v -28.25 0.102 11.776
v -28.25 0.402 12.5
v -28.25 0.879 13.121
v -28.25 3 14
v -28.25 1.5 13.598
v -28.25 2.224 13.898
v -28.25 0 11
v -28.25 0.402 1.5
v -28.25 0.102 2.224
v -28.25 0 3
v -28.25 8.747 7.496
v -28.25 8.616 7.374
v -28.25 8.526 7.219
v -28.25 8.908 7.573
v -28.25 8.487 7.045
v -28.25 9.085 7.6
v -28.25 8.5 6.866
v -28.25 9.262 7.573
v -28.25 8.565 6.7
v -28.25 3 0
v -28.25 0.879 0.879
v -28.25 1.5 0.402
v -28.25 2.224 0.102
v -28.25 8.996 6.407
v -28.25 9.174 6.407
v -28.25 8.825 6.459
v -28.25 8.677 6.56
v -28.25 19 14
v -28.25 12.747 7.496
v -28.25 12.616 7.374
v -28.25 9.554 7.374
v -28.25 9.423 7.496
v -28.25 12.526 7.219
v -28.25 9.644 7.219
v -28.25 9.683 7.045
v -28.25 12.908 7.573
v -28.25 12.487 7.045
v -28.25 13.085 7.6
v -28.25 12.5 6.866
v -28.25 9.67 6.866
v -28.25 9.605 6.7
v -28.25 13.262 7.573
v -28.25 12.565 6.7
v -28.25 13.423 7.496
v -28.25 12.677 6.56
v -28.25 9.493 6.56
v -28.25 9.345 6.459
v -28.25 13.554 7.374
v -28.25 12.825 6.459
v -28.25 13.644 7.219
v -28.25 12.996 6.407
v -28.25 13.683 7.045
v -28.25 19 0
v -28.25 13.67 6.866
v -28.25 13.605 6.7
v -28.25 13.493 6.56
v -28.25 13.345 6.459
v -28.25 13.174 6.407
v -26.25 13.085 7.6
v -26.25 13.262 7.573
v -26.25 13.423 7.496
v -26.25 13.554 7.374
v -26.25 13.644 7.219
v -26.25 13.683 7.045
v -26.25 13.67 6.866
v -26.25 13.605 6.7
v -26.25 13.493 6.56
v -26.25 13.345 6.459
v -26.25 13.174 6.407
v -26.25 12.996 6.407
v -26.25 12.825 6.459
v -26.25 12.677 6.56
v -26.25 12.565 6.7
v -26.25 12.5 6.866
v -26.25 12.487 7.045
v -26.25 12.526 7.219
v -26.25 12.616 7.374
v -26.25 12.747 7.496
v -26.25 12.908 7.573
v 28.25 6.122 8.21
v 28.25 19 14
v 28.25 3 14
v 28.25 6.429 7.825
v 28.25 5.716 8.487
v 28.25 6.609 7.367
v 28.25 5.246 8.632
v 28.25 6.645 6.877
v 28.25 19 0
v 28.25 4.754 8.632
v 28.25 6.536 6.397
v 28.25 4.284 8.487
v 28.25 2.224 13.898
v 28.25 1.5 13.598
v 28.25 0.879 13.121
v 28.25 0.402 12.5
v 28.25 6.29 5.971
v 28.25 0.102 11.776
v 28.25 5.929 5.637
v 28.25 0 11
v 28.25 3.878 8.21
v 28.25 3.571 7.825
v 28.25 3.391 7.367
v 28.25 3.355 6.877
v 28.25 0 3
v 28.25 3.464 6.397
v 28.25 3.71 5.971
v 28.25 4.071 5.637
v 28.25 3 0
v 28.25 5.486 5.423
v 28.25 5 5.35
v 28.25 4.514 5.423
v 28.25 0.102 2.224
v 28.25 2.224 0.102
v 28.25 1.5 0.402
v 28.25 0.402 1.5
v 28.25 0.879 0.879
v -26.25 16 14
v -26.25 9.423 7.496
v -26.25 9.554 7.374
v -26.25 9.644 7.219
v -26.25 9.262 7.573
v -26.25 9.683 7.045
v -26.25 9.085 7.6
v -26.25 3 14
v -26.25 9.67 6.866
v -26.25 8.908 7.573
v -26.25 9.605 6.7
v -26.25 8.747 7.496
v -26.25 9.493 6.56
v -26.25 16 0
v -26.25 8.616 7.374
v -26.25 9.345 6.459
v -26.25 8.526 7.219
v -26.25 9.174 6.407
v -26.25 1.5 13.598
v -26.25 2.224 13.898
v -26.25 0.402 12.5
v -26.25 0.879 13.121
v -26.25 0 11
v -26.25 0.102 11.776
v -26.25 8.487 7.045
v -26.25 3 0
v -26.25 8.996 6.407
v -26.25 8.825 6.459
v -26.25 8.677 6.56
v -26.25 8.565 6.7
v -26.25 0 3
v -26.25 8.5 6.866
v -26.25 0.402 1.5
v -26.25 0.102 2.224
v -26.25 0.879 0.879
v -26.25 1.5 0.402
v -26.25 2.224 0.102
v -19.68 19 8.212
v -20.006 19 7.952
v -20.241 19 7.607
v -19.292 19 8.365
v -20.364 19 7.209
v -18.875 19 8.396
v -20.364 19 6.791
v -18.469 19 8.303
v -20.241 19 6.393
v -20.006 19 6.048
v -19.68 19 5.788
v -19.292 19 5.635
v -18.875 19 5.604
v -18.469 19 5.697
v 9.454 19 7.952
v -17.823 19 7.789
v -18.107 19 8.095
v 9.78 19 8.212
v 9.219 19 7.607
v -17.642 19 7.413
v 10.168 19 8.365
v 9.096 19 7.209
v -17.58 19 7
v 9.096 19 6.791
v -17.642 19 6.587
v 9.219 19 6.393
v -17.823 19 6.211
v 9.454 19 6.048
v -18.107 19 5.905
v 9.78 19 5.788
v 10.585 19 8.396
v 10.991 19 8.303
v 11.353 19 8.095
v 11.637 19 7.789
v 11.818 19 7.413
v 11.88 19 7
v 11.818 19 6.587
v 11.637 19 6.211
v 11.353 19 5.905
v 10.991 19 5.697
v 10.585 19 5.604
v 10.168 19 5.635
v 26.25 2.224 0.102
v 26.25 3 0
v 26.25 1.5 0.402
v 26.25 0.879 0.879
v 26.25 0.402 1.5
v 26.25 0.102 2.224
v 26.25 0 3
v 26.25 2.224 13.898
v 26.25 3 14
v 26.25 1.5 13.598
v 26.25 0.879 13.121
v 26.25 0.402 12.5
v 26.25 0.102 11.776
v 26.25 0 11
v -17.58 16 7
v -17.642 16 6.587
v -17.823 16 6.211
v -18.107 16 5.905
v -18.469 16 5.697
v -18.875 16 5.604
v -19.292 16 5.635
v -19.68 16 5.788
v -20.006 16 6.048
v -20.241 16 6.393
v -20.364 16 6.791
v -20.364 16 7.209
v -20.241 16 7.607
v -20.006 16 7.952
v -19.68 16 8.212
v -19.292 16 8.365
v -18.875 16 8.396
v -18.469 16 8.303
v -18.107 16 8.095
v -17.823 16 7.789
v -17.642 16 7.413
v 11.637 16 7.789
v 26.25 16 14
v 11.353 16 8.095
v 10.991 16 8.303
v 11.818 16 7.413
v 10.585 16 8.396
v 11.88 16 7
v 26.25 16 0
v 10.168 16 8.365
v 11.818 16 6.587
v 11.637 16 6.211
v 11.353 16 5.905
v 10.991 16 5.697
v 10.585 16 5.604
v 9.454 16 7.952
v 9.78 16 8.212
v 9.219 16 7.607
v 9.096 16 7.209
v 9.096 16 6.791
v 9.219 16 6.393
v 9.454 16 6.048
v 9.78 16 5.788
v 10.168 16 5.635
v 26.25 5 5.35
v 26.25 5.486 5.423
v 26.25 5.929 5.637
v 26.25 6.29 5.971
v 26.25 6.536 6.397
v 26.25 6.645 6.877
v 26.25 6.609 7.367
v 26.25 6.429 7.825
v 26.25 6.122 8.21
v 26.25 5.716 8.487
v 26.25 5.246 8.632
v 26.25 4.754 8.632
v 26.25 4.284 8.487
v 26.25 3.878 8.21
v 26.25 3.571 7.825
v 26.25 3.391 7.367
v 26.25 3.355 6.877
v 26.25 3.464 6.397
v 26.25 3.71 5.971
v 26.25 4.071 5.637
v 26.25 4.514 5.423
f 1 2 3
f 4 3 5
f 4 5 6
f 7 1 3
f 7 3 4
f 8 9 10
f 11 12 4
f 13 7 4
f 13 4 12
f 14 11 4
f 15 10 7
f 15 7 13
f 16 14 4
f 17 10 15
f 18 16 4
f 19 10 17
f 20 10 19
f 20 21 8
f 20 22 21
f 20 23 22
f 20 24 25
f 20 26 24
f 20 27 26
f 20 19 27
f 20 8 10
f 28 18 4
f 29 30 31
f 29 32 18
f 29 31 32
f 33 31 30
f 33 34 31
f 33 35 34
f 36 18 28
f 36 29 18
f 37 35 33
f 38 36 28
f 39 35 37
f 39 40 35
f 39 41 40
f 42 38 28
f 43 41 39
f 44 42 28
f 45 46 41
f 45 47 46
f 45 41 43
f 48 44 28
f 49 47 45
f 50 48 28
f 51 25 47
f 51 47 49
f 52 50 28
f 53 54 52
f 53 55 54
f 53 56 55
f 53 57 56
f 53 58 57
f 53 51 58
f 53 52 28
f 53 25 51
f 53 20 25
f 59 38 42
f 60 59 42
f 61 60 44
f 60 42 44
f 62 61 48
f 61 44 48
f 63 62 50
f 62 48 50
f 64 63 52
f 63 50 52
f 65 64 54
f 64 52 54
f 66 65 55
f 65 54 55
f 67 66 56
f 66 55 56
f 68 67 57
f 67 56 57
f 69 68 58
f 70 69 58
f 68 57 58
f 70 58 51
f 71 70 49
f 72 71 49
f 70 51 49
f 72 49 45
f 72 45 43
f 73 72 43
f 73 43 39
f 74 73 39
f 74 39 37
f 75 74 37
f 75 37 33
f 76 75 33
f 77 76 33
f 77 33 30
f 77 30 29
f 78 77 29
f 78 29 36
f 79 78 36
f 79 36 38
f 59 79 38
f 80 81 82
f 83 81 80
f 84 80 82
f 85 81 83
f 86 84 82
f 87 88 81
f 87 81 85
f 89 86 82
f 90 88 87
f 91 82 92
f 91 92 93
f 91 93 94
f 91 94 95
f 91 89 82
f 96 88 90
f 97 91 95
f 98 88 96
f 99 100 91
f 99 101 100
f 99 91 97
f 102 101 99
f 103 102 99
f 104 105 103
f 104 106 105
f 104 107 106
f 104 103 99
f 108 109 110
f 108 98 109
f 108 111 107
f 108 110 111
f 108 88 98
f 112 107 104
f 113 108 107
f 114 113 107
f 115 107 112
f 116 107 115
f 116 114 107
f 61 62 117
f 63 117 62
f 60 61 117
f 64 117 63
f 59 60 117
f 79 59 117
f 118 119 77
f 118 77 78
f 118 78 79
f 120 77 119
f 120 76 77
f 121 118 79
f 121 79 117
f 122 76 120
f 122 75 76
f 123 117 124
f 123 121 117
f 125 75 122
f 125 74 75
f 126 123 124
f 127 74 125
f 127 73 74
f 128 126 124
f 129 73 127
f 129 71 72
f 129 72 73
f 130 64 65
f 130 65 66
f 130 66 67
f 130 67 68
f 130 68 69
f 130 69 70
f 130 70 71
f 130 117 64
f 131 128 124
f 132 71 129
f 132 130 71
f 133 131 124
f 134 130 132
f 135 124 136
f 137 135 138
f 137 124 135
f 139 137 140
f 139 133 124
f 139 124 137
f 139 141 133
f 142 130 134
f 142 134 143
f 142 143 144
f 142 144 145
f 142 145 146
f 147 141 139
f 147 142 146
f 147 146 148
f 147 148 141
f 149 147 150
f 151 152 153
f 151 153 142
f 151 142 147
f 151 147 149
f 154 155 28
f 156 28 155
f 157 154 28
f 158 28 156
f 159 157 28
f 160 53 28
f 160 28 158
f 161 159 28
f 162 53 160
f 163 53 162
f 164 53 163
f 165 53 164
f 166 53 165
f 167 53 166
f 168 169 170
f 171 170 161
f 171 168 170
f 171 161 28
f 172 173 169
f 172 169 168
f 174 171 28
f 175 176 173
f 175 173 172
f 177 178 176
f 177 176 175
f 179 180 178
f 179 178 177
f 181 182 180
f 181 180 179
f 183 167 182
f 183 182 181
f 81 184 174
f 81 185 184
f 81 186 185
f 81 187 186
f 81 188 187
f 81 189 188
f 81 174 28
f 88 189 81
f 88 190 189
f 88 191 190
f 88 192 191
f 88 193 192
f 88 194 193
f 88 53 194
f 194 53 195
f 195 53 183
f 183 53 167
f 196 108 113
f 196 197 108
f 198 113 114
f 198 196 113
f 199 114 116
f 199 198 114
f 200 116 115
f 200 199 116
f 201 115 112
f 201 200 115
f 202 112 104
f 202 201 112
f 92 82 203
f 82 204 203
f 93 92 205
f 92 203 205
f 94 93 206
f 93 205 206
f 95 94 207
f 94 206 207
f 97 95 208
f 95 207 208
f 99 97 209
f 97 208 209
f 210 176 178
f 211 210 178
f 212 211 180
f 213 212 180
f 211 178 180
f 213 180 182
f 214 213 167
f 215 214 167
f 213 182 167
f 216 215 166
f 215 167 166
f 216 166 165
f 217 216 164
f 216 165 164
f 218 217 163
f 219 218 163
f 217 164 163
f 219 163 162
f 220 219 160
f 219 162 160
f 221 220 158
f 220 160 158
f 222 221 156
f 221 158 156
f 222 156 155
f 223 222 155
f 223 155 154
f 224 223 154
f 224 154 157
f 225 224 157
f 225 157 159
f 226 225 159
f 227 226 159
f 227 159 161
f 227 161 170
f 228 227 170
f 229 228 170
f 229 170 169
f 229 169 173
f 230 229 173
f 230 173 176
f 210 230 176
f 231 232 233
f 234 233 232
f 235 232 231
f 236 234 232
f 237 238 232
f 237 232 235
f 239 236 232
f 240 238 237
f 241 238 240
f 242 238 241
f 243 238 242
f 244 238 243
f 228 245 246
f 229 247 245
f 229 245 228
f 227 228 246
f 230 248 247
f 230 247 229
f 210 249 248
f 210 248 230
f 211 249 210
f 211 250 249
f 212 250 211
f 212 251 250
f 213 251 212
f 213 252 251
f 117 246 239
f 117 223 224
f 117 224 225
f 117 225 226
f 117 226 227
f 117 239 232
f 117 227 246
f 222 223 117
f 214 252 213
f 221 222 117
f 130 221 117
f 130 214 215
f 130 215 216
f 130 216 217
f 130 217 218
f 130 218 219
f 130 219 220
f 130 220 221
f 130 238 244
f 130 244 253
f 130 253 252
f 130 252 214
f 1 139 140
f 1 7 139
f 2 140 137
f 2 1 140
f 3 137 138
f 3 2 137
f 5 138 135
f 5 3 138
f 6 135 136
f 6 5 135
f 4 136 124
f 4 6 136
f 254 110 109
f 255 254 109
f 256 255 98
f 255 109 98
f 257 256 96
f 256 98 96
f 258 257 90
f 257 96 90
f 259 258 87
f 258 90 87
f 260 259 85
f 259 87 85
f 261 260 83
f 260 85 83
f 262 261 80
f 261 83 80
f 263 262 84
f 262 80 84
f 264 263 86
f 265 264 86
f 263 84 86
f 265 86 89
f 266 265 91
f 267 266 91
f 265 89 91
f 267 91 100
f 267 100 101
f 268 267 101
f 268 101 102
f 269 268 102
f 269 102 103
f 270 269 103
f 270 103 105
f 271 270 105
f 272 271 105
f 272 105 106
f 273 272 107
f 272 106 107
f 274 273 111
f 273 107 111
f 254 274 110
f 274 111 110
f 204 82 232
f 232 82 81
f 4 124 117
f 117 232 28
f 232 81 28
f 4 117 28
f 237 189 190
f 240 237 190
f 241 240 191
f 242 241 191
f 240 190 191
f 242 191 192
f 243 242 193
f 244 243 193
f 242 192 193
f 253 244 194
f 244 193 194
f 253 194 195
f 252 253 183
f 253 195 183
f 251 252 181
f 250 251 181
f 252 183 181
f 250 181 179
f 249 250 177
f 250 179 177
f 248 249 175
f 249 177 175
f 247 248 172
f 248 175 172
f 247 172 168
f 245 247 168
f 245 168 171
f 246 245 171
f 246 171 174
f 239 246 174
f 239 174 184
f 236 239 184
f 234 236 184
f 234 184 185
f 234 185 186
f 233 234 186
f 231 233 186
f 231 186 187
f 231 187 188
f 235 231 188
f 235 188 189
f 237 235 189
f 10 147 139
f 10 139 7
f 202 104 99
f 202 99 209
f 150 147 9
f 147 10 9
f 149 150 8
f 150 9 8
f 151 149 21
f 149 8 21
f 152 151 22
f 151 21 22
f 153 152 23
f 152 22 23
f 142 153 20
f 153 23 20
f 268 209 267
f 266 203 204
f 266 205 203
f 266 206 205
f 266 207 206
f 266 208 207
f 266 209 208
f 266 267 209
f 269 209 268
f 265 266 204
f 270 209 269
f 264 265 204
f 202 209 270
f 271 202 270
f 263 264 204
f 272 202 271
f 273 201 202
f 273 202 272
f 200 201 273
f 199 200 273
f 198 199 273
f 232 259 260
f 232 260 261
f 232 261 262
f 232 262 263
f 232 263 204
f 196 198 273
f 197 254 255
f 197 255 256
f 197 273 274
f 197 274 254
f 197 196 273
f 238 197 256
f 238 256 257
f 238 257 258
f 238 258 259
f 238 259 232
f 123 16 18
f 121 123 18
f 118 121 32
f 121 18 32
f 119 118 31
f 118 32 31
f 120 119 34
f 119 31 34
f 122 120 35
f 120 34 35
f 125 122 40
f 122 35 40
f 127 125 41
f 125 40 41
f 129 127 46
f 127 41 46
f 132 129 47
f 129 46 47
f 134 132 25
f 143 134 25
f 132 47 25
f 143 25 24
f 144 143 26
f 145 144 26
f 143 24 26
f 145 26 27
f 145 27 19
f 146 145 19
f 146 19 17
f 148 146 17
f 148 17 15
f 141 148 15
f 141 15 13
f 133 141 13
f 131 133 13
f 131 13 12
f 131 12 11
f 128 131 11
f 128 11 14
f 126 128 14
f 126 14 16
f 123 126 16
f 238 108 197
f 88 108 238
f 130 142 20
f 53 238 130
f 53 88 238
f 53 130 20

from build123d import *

# Parameters (mm, degrees)
EXTRUDE_1_DEPTH     = 14
SKETCH_2_R          = 1.65
CUT_EXTRUDE_1_DEPTH = 2
SKETCH_3_R          = 1.4
CUT_EXTRUDE_2_DEPTH = 14
FILLET_1_R          = 3
SKETCH_5_R          = 0.6
CUT_EXTRUDE_3_DEPTH = 10


with BuildPart() as part:
    # 草图1 → 凸台-拉伸1 (new body)
    with BuildSketch(Plane.XY):
        Polygon((-28.25, 0), (-28.25, 19), (28.25, 19), (28.25, 0), (26.25, 0), (26.25, 16), (-26.25, 16), (-26.25, 0), align=None)
    extrude(amount=EXTRUDE_1_DEPTH)

    # 草图2 → 切除-拉伸1 (cut)
    with BuildSketch(Plane(origin=(28.25, 0, 0), x_dir=(0, 0, -1), z_dir=(1, 0, 0))):
        with Locations((-7, 5)):
            Circle(SKETCH_2_R)
    extrude(amount=-CUT_EXTRUDE_1_DEPTH, mode=Mode.SUBTRACT)

    # 草图3 → 切除-拉伸2 (cut)
    with BuildSketch(Plane(origin=(0, 19, 0), x_dir=(1, 0, 0), z_dir=(0, 1, 0))):
        with Locations((-18.98, -7)):
            Circle(SKETCH_3_R)
        with Locations((10.48, -7)):
            Circle(SKETCH_3_R)
    extrude(amount=-CUT_EXTRUDE_2_DEPTH, mode=Mode.SUBTRACT)

    # 圆角1
    fillet_1_edges = [part.edges().sort_by_distance(p)[0] for p in [
        (-27.25, 0, 0),
        (27.25, 0, 0),
        (27.25, 0, 14),
        (-27.25, 0, 14),
    ]]
    fillet(fillet_1_edges, radius=FILLET_1_R)

    # 草图5 → 切除-拉伸3 (cut)
    with BuildSketch(Plane.ZY.offset(28.25)):
        with Locations((7, 9.085)):
            Circle(SKETCH_5_R)
        with Locations((7, 13.085)):
            Circle(SKETCH_5_R)
    extrude(amount=-CUT_EXTRUDE_3_DEPTH, mode=Mode.SUBTRACT)


solid = part.part
